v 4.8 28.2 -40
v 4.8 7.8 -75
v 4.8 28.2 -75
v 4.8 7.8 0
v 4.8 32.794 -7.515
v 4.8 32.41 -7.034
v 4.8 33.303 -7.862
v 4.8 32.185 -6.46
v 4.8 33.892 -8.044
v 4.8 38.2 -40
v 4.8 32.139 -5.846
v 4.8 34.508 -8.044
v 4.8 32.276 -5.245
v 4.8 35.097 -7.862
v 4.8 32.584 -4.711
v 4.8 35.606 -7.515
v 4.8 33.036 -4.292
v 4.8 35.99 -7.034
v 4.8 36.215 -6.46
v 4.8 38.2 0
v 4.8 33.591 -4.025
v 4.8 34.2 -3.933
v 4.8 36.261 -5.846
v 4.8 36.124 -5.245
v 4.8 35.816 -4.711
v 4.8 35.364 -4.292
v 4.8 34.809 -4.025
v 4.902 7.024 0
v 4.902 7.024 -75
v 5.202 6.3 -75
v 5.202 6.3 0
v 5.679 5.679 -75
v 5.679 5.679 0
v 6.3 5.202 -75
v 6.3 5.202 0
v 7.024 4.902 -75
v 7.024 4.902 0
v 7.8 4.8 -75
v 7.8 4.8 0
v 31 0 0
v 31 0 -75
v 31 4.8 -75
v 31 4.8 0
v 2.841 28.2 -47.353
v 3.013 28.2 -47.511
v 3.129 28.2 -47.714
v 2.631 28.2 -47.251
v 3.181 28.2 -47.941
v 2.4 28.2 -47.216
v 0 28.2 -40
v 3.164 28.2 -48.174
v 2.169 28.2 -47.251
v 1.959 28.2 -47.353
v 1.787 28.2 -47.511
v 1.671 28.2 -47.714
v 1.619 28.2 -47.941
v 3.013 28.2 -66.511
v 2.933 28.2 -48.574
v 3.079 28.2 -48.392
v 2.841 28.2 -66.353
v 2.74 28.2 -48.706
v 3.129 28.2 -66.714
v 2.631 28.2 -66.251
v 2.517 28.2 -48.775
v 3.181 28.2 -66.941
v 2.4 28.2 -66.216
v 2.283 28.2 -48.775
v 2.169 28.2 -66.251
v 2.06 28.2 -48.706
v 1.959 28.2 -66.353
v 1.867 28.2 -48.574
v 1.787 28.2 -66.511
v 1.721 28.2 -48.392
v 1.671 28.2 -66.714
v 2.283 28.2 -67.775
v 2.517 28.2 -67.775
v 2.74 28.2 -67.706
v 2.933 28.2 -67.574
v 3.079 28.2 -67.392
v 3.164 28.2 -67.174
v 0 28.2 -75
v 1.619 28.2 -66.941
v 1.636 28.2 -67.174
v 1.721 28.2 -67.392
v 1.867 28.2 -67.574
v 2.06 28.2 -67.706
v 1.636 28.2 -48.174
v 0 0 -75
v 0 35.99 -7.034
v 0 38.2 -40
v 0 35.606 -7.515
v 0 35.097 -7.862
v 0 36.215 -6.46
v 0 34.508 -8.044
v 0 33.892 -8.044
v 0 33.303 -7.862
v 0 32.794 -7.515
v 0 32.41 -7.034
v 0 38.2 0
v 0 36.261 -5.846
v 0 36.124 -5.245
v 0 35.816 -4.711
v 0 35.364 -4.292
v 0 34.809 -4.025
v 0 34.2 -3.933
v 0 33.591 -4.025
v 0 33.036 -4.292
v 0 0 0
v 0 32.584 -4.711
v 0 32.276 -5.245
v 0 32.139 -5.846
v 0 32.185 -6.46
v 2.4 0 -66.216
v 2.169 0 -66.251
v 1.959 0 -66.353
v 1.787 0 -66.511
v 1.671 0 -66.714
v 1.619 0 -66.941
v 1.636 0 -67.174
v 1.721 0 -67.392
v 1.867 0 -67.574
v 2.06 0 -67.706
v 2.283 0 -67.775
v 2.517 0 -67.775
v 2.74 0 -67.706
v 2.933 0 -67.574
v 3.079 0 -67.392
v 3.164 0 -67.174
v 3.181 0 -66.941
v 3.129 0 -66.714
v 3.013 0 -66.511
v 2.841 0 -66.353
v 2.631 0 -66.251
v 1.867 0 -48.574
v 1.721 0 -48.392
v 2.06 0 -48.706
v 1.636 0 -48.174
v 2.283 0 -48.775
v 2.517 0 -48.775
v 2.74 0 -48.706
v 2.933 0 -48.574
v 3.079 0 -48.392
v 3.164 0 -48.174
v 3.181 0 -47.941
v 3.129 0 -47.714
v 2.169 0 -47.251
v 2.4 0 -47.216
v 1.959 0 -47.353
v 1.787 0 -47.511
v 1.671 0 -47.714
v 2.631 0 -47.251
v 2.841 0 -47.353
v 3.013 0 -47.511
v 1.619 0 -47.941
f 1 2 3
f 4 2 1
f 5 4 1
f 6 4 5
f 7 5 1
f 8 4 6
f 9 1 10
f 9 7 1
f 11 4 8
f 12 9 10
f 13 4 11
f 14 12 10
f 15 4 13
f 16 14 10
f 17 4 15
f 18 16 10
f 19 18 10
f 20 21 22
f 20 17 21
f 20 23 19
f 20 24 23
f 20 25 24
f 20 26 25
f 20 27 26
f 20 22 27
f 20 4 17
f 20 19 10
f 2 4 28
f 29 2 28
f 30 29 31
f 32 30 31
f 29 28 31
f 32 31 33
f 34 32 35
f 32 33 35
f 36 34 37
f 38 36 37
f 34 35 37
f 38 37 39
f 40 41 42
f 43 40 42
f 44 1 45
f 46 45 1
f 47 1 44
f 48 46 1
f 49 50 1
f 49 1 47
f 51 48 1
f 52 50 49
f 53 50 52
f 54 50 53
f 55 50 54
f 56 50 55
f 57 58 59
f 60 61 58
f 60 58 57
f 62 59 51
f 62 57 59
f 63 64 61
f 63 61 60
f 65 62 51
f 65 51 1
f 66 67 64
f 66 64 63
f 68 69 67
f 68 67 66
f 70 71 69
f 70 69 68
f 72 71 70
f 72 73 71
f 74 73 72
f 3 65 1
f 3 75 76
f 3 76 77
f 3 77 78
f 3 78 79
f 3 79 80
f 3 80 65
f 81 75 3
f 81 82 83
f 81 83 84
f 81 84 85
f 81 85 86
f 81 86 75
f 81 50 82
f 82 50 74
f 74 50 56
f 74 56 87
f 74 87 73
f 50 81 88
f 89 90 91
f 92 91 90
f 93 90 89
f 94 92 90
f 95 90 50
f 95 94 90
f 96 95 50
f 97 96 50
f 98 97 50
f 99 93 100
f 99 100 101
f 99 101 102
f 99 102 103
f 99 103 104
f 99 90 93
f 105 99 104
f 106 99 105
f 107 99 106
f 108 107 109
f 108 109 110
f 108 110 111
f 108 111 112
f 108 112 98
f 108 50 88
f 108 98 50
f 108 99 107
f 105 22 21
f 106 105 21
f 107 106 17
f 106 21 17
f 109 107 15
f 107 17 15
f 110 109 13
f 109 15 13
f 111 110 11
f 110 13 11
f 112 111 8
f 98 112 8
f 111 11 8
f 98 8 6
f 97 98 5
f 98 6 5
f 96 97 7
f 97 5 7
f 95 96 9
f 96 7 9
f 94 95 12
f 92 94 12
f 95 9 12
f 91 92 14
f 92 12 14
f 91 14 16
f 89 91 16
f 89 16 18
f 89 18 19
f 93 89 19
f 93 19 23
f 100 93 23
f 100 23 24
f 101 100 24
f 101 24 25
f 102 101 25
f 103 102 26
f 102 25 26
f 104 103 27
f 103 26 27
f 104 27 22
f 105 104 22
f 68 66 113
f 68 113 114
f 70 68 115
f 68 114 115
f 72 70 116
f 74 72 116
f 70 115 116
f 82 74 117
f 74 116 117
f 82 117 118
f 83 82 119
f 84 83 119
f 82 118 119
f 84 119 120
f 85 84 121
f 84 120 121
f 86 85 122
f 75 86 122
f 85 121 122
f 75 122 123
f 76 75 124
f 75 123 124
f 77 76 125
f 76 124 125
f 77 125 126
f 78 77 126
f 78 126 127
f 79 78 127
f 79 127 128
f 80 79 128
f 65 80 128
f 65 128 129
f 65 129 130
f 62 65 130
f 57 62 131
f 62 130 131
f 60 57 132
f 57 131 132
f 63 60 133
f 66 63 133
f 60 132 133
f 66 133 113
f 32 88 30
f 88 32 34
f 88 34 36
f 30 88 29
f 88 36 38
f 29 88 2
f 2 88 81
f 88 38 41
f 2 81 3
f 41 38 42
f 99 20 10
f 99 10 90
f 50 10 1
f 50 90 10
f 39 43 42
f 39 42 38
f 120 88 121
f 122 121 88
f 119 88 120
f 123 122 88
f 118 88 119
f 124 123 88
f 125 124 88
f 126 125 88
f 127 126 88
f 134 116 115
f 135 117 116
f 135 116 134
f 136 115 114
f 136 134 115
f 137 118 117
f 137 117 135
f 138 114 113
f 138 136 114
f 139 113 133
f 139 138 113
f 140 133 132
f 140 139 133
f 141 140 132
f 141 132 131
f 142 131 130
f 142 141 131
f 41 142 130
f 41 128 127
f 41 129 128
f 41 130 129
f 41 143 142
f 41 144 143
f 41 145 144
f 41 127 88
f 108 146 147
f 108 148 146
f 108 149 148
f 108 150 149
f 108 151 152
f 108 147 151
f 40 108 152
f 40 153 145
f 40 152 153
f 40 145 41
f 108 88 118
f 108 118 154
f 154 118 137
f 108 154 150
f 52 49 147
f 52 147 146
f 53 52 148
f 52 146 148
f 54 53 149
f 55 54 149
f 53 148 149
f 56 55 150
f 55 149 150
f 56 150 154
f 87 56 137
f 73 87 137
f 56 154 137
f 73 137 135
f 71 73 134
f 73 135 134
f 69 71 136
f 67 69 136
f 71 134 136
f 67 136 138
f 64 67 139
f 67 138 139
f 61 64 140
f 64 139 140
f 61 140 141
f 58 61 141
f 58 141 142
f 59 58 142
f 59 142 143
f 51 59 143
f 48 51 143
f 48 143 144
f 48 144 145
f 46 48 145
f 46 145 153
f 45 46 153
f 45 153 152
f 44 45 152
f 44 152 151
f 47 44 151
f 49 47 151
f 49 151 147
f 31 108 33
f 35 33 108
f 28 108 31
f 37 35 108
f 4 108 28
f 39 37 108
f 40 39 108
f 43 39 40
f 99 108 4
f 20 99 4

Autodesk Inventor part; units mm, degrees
ref_plane "YZ Plane" through (0, 0, 0) normal (1, 0, 0) x (0, 1, 0)
ref_plane "XZ Plane" through (0, 0, 0) normal (0, 1, 0) x (-1, 0, 0)
ref_plane "XY Plane" through (0, 0, 0) normal (0, 0, 1) x (1, 0, 0)
sketch "Sketch1" plane through (0, 0, 0) normal (0, 0, 1) x (1, 0, 0)
  line L0 (0, 38.2) -> (0, 0)
  line L1 (0, 0) -> (31, 0)
  line L2 (31, 0) -> (31, 4.8)
  line L3 (31, 4.8) -> (7.8, 4.8)
  line L4 (4.8, 7.8) -> (4.8, 38.2)
  line L5 (4.8, 38.2) -> (0, 38.2)
  arc A0 (4.8, 7.8) -> (7.8, 4.8) centre (7.8, 7.8) ccw
  dimension "d0" = 31
  dimension "d1" = 38.2
  dimension "d2" = 4.8
  dimension "d3" = 4.8
  dimension "d4" = 3
extrude "Extrusion1" add sketch "Sketch1" against normal blind 75
sketch "Sketch2" plane through (0, 0, 0) normal (-1, 0, 0) x (0, 0, 1)
  line L0 (0, 0) -> (0, 38.2) projected
  line L1 (0, 38.2) -> (-75, 38.2) projected
  point P0 (-6, 34.2)
  dimension "d7" = 4
  dimension "d8" = 6
hole "Hole1" at (0, 34.2, -6) direction (1, 0, 0) diameter 4.134 end through all thread size "M5x0.8" class "6H" standard "ANSI Metric M Profile"
sketch "Sketch3" plane through (0, 0, 0) normal (-1, 0, 0) x (0, 0, 1)
  line L0 (0, 0) -> (0, 38.2) projected
  line L1 (0, 38.2) -> (-75, 38.2) projected
  line L2 (-100.4339, 50.496) -> (-40, 50.496)
  line L3 (-40, 50.496) -> (-40, 28.2)
  line L4 (-40, 28.2) -> (-100.4339, 28.2)
  line L5 (-100.4339, 28.2) -> (-100.4339, 50.496)
  dimension "d16" = 40
  dimension "d17" = 10
extrude "Extrusion2" cut sketch "Sketch3" against normal through all
sketch "Sketch4" plane through (0, 28.2, -40) normal (0, 1, 0) x (1, 0, 0)
  line L0 (0, 35) -> (4.8, 35) projected
  line L1 (0, 0) -> (4.8, 0) projected
  point P0 (0, -40)
  point P1 (2.4, 27)
  point P2 (2.4, 8)
  dimension "d20" = 8
  dimension "d21" = 8
  dimension "d22" = 19
hole "Hole2" at (2.4, 28.2, -67) at (2.4, 28.2, -48) direction (0, -1, 0) diameter 1.567 end through all thread size "M2x0.4" class "6H" standard "ISO Metric profile"
properties part number "Left Angle"
